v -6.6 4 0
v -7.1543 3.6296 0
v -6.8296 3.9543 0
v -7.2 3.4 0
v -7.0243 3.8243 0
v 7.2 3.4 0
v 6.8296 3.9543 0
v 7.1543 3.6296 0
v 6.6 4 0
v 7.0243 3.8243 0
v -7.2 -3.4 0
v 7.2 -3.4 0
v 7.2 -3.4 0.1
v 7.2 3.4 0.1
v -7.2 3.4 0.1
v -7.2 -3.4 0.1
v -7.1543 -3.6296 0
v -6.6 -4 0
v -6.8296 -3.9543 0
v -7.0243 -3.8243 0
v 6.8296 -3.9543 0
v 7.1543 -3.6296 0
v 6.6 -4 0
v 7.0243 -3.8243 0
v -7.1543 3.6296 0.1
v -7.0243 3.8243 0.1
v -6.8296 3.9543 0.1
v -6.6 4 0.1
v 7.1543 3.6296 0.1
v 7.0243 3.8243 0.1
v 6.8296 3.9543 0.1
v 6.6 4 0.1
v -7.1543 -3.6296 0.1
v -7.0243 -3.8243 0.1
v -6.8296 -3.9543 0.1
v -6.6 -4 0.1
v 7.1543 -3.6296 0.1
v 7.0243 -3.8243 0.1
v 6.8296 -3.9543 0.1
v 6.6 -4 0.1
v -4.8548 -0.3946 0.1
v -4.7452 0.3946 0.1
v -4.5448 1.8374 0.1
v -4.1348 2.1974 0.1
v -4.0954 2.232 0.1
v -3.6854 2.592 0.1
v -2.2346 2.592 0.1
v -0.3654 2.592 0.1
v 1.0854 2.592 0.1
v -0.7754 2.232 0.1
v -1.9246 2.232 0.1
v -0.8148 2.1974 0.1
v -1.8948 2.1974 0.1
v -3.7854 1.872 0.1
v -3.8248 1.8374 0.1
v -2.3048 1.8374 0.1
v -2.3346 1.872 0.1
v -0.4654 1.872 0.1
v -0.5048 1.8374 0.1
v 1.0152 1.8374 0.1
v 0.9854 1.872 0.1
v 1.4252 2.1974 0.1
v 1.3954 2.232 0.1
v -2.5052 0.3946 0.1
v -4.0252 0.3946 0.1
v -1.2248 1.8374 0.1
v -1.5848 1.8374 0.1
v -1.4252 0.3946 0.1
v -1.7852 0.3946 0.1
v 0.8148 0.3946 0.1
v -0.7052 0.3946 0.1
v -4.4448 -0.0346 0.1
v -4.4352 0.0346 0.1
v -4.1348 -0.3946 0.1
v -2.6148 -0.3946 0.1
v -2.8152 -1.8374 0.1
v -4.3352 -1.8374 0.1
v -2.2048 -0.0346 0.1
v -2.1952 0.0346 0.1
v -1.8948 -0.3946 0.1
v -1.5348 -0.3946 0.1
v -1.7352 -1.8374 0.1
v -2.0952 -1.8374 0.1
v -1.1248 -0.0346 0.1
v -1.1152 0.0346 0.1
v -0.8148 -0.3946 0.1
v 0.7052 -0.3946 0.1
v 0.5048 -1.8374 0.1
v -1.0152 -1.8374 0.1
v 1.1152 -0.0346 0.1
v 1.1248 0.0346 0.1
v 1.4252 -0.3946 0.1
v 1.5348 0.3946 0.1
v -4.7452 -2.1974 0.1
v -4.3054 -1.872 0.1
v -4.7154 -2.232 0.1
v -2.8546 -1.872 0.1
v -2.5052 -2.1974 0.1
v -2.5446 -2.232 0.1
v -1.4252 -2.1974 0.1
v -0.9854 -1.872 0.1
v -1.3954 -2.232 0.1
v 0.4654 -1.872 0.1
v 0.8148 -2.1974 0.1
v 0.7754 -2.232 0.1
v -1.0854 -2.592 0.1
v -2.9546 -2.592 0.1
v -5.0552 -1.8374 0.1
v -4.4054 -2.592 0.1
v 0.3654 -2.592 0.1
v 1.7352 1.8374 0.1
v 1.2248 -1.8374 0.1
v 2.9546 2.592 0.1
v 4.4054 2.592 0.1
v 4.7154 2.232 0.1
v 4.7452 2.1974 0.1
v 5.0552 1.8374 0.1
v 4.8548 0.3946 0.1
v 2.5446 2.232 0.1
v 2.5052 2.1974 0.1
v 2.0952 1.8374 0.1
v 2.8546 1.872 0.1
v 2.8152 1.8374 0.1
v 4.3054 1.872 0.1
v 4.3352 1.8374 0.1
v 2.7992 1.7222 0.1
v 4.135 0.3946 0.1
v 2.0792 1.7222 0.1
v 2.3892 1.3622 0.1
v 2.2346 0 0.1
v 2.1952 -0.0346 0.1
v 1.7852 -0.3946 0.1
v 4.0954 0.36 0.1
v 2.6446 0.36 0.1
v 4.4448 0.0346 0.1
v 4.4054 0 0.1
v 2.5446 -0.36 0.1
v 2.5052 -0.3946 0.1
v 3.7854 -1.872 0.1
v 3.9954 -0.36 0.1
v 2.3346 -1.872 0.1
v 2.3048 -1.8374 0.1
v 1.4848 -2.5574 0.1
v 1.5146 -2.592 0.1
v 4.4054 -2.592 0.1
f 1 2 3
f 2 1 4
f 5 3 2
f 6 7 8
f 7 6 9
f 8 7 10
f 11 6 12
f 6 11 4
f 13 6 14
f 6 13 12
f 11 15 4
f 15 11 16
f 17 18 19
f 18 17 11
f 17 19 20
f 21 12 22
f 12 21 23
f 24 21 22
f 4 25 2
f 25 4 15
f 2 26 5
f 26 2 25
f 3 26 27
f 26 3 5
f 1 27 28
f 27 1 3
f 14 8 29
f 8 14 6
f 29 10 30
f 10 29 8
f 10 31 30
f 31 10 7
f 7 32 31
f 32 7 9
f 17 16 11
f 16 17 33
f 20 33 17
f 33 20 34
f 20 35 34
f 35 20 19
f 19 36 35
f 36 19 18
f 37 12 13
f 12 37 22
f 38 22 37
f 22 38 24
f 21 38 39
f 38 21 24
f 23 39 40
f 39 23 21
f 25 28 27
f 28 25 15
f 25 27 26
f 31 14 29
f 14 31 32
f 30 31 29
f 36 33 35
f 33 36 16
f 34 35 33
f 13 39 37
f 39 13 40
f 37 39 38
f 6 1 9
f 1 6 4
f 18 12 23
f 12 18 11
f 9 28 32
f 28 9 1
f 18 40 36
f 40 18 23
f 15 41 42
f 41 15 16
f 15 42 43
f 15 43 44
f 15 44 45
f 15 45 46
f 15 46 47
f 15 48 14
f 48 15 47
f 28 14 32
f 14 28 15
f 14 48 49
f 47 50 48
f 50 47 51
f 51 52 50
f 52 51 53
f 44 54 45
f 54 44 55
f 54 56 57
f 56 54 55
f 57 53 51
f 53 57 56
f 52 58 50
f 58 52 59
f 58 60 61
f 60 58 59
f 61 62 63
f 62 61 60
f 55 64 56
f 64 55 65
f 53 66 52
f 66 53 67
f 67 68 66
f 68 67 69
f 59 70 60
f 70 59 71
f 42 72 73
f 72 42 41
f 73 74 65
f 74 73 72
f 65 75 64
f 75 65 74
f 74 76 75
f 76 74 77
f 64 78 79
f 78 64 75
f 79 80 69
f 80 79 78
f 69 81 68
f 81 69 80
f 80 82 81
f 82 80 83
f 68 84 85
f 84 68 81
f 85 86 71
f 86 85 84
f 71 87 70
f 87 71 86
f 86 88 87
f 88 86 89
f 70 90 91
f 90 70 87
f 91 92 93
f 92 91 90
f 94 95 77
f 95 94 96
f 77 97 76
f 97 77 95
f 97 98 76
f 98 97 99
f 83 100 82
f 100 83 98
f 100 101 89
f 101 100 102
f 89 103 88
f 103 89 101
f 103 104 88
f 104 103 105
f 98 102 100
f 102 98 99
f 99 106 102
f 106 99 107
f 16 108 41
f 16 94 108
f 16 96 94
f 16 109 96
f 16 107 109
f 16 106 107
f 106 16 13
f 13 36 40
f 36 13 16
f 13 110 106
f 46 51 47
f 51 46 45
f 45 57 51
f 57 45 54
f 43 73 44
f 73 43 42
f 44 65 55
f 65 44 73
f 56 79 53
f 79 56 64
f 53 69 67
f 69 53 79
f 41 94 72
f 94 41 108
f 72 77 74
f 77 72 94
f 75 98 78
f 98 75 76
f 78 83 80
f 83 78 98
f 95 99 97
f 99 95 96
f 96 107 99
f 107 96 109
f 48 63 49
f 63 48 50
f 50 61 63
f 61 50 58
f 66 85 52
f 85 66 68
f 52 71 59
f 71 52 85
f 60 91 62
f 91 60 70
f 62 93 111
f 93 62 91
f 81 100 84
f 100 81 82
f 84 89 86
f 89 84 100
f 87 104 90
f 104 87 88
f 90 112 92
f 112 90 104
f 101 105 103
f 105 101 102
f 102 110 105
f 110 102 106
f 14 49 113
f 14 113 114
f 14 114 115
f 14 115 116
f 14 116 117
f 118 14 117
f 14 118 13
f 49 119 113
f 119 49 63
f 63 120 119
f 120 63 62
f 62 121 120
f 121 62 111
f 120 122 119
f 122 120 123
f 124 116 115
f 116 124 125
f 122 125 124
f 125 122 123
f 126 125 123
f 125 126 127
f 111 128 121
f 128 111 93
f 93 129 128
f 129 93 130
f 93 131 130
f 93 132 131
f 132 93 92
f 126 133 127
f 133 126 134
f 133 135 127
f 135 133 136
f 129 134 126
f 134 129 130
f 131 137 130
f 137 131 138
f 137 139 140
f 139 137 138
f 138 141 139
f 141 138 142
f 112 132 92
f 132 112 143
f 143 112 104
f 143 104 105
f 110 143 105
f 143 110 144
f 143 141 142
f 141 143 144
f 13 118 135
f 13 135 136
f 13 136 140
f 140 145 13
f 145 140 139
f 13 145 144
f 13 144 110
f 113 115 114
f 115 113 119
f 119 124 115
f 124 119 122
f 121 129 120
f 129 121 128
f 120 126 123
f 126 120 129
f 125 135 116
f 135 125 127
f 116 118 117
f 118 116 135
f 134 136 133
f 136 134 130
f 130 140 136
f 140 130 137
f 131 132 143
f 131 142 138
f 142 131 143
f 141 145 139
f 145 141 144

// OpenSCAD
// file: ../p/box3u12.scad
use <../lib.scad>
function ldraw_lib__box3u12() = [
// 0 Box with 3 Parallel Faces without Any Edges
// 0 Name: box3u12.dat
// 0 Author: J.C. Tchang [tchang]
// 0 !LDRAW_ORG Primitive UPDATE 2014-02
// 0 !LICENSE Licensed under CC BY 4.0 : see CAreadme.txt
// 
// 0 BFC CERTIFY CCW
  [0,"BFC","CERTIFY"],
  [0,"BFC","CCW"],
// 
// 0 !HISTORY 2014-12-23 [PTadmin] Official Update 2014-02
// 
// 
// 4 16 -1 1 1 1 1 1 1 1 -1 -1 1 -1
  [4,16,-1,1,1,1,1,1,1,1,-1,-1,1,-1],
// 4 16 -1 1 1 -1 0 1 1 0 1 1 1 1
  [4,16,-1,1,1,-1,0,1,1,0,1,1,1,1],
// 4 16 1 1 -1 1 0 -1 -1 0 -1 -1 1 -1
  [4,16,1,1,-1,1,0,-1,-1,0,-1,-1,1,-1],
];
module ldraw_lib__box3u12(step=0, col=false, unit=2/5, alt=false, line=0.2, solid=!$preview)
    makepoly(ldraw_lib__box3u12(), step=step, col=col, unit=unit, alt=alt, line=line, solid=solid);
ldraw_lib__box3u12(line=0.2);
// file: ../p/1-4cyli.scad
use <../lib.scad>
function ldraw_lib__1_4cyli() = [
// 0 Cylinder 0.25
// 0 Name: 1-4cyli.dat
// 0 Author: James Jessiman
// 0 !LDRAW_ORG Primitive UPDATE 2012-01
// 0 !LICENSE Licensed under CC BY 4.0 : see CAreadme.txt
// 
// 0 BFC CERTIFY CCW
  [0,"BFC","CERTIFY"],
  [0,"BFC","CCW"],
// 
// 0 !HISTORY 2002-03-23 [sbliss] Added BFC statement.
// 0 !HISTORY 2002-04-25 [PTadmin] Official Update 2002-02
// 0 !HISTORY 2007-06-22 [PTadmin] Header formatted for Contributor Agreement
// 0 !HISTORY 2008-07-01 [PTadmin] Official Update 2008-01
// 0 !HISTORY 2012-02-16 [Philo] Changed to CCW
// 0 !HISTORY 2012-03-30 [PTadmin] Official Update 2012-01
// 
// 
// 4 16 1 1 0 0.9239 1 0.3827 0.9239 0 0.3827 1 0 0
  [4,16,1,1,0,0.9239,1,0.3827,0.9239,0,0.3827,1,0,0],
// 5 24 1 0 0 1 1 0 0.9239 0 0.3827 1 0 -1
  [5,24,1,0,0,1,1,0,0.9239,0,0.3827,1,0,-1],
// 4 16 0.9239 1 0.3827 0.7071 1 0.7071 0.7071 0 0.7071 0.9239 0 0.3827
  [4,16,0.9239,1,0.3827,0.7071,1,0.7071,0.7071,0,0.7071,0.9239,0,0.3827],
// 5 24 0.9239 0 0.3827 0.9239 1 0.3827 0.7071 0 0.7071 1 0 0
  [5,24,0.9239,0,0.3827,0.9239,1,0.3827,0.7071,0,0.7071,1,0,0],
// 4 16 0.7071 1 0.7071 0.3827 1 0.9239 0.3827 0 0.9239 0.7071 0 0.7071
  [4,16,0.7071,1,0.7071,0.3827,1,0.9239,0.3827,0,0.9239,0.7071,0,0.7071],
// 5 24 0.7071 0 0.7071 0.7071 1 0.7071 0.3827 0 0.9239 0.9239 0 0.3827
  [5,24,0.7071,0,0.7071,0.7071,1,0.7071,0.3827,0,0.9239,0.9239,0,0.3827],
// 4 16 0.3827 1 0.9239 0 1 1 0 0 1 0.3827 0 0.9239
  [4,16,0.3827,1,0.9239,0,1,1,0,0,1,0.3827,0,0.9239],
// 5 24 0.3827 0 0.9239 0.3827 1 0.9239 0 0 1 0.7071 0 0.7071
  [5,24,0.3827,0,0.9239,0.3827,1,0.9239,0,0,1,0.7071,0,0.7071],
// 5 24 0 0 1 0 1 1 0.3827 0 0.9239 -1 0 1
  [5,24,0,0,1,0,1,1,0.3827,0,0.9239,-1,0,1],
];
module ldraw_lib__1_4cyli(step=0, col=false, unit=2/5, alt=false, line=0.2, solid=!$preview)
    makepoly(ldraw_lib__1_4cyli(), step=step, col=col, unit=unit, alt=alt, line=line, solid=solid);
ldraw_lib__1_4cyli(line=0.2);
// file: ../p/1-4chrd.scad
use <../lib.scad>
function ldraw_lib__1_4chrd() = [
// 0 Chord 0.25
// 0 Name: 1-4chrd.dat
// 0 Author: Max Martin Richter [MMR1988]
// 0 !LDRAW_ORG Primitive UPDATE 2023-05
// 0 !LICENSE Licensed under CC BY 4.0 : see CAreadme.txt
// 
// 0 BFC CERTIFY CCW
  [0,"BFC","CERTIFY"],
  [0,"BFC","CCW"],
// 
// 0 !HISTORY 2004-04-22 [PTadmin] Official Update 2004-02
// 0 !HISTORY 2007-10-09 [PTadmin] Header formatted for Contributor Agreement
// 0 !HISTORY 2008-07-01 [PTadmin] Official Update 2008-01
// 0 !HISTORY 2012-08-02 [MMR1988] Re-creation with PrimGen2 and Rectifier
// 0 !HISTORY 2012-08-09 [PTadmin] Official Update 2012-02
// 0 !HISTORY 2023-10-27 [OrionP] Change author to MMR1988 from hafhead
// 0 !HISTORY 2023-10-31 [OrionP] Official Update 2023-05
// 
// 4 16 0.9239 0 0.3827 0.3827 0 0.9239 0 0 1 1 0 0
  [4,16,0.9239,0,0.3827,0.3827,0,0.9239,0,0,1,1,0,0],
// 3 16 0.7071 0 0.7071 0.3827 0 0.9239 0.9239 0 0.3827
  [3,16,0.7071,0,0.7071,0.3827,0,0.9239,0.9239,0,0.3827],
];
module ldraw_lib__1_4chrd(step=0, col=false, unit=2/5, alt=false, line=0.2, solid=!$preview)
    makepoly(ldraw_lib__1_4chrd(), step=step, col=col, unit=unit, alt=alt, line=line, solid=solid);
ldraw_lib__1_4chrd(line=0.2);
// main file
use <../lib.scad>
use <s/6221655aks01.scad>
function ldraw_lib__6221655al() = [
// 0 Sticker  1.0 x  1.8 with Yellow Digital "2" on Black Background
// 0 Name: 6221655al.dat
// 0 Author: Massimo Maso [Sirio]
// 0 !LDRAW_ORG Part UPDATE 2024-09
// 0 !LICENSE Licensed under CC BY 4.0 : see CAreadme.txt
// 
// 0 BFC CERTIFY CCW
  [0,"BFC","CERTIFY"],
  [0,"BFC","CCW"],
// 
// 0 !KEYWORDS 3.0, 911 RSR, Set 75888, Speed Champions, Turbo
// 
// 0 !HISTORY 2024-10-27 [OrionP] Official Update 2024-09
// 
// 0 // Subpart
// 1 16 0 0 0 1 0 0 0 1 0 0 0 1 s\6221655aks01.dat
  [1,16,0,0,0,1,0,0,0,1,0,0,0,1, ldraw_lib__s__6221655aks01()],
// 0 // Top face
// 0 // Black faces
// 3 0 18 -.25 8.5 2.7136 -.25 6.48 7.3864 -.25 6.48
  [3,0,18,-.25,8.5,2.7136,-.25,6.48,7.3864,-.25,6.48],
// 3 0 18 -.25 8.5 7.3864 -.25 6.48 11.0136 -.25 6.48
  [3,0,18,-.25,8.5,7.3864,-.25,6.48,11.0136,-.25,6.48],
// 3 0 18 -.25 8.5 11.0136 -.25 6.48 11.7886 -.25 5.58
  [3,0,18,-.25,8.5,11.0136,-.25,6.48,11.7886,-.25,5.58],
// 3 0 18 -.25 8.5 11.7886 -.25 5.58 11.863 -.25 5.4936
  [3,0,18,-.25,8.5,11.7886,-.25,5.58,11.863,-.25,5.4936],
// 3 0 18 -.25 8.5 11.863 -.25 5.4936 12.638 -.25 4.5936
  [3,0,18,-.25,8.5,11.863,-.25,5.4936,12.638,-.25,4.5936],
// 4 0 18 -.25 8.5 12.638 -.25 4.5936 12.137 -.25 .9864 18 -.25 -8.5
  [4,0,18,-.25,8.5,12.638,-.25,4.5936,12.137,-.25,.9864,18,-.25,-8.5],
// 4 0 6.3614 -.25 5.58 7.3864 -.25 6.48 2.7136 -.25 6.48 3.4886 -.25 5.58
  [4,0,6.3614,-.25,5.58,7.3864,-.25,6.48,2.7136,-.25,6.48,3.4886,-.25,5.58],
// 4 0 6.3614 -.25 5.58 3.4886 -.25 5.58 3.563 -.25 5.4936 6.263 -.25 5.4936
  [4,0,6.3614,-.25,5.58,3.4886,-.25,5.58,3.563,-.25,5.4936,6.263,-.25,5.4936],
// 4 0 6.263 -.25 5.4936 3.563 -.25 5.4936 4.338 -.25 4.5936 5.238 -.25 4.5936
  [4,0,6.263,-.25,5.4936,3.563,-.25,5.4936,4.338,-.25,4.5936,5.238,-.25,4.5936],
// 4 0 6.263 -.25 5.4936 7.038 -.25 4.5936 7.1364 -.25 4.68 6.3614 -.25 5.58
  [4,0,6.263,-.25,5.4936,7.038,-.25,4.5936,7.1364,-.25,4.68,6.3614,-.25,5.58],
// 4 0 10.838 -.25 4.5936 11.863 -.25 5.4936 11.7886 -.25 5.58 10.7636 -.25 4.68
  [4,0,10.838,-.25,4.5936,11.863,-.25,5.4936,11.7886,-.25,5.58,10.7636,-.25,4.68],
// 4 0 10.838 -.25 4.5936 10.7636 -.25 4.68 7.1364 -.25 4.68 7.038 -.25 4.5936
  [4,0,10.838,-.25,4.5936,10.7636,-.25,4.68,7.1364,-.25,4.68,7.038,-.25,4.5936],
// 4 0 10.838 -.25 4.5936 7.038 -.25 4.5936 6.998 -.25 4.3056 10.3375 -.25 .9864
  [4,0,10.838,-.25,4.5936,7.038,-.25,4.5936,6.998,-.25,4.3056,10.3375,-.25,.9864],
// 4 0 3.837 -.25 .9864 5.198 -.25 4.3056 5.238 -.25 4.5936 4.338 -.25 4.5936
  [4,0,3.837,-.25,.9864,5.198,-.25,4.3056,5.238,-.25,4.5936,4.338,-.25,4.5936],
// 4 0 3.837 -.25 .9864 5.5864 -.25 0 5.973 -.25 3.4056 5.198 -.25 4.3056
  [4,0,3.837,-.25,.9864,5.5864,-.25,0,5.973,-.25,3.4056,5.198,-.25,4.3056],
// 3 0 3.837 -.25 .9864 5.488 -.25 -.0864 5.5864 -.25 0
  [3,0,3.837,-.25,.9864,5.488,-.25,-.0864,5.5864,-.25,0],
// 4 0 3.837 -.25 .9864 3.563 -.25 -.9864 4.463 -.25 -.9864 5.488 -.25 -.0864
  [4,0,3.837,-.25,.9864,3.563,-.25,-.9864,4.463,-.25,-.9864,5.488,-.25,-.0864],
// 4 0 10.2386 -.25 .9 10.3375 -.25 .9864 6.998 -.25 4.3056 6.6114 -.25 .9
  [4,0,10.2386,-.25,.9,10.3375,-.25,.9864,6.998,-.25,4.3056,6.6114,-.25,.9],
// 4 0 10.2386 -.25 .9 11.0136 -.25 0 11.112 -.25 .0864 10.3375 -.25 .9864
  [4,0,10.2386,-.25,.9,11.0136,-.25,0,11.112,-.25,.0864,10.3375,-.25,.9864],
// 4 0 5.5864 -.25 0 6.6114 -.25 .9 6.998 -.25 4.3056 5.973 -.25 3.4056
  [4,0,5.5864,-.25,0,6.6114,-.25,.9,6.998,-.25,4.3056,5.973,-.25,3.4056],
// 4 0 5.5864 -.25 0 5.488 -.25 -.0864 6.263 -.25 -.9864 6.3614 -.25 -.9
  [4,0,5.5864,-.25,0,5.488,-.25,-.0864,6.263,-.25,-.9864,6.3614,-.25,-.9],
// 4 0 6.263 -.25 -.9864 9.4636 -.25 -4.68 9.9886 -.25 -.9 6.3614 -.25 -.9
  [4,0,6.263,-.25,-.9864,9.4636,-.25,-4.68,9.9886,-.25,-.9,6.3614,-.25,-.9],
// 4 0 6.263 -.25 -.9864 5.762 -.25 -4.5936 5.8364 -.25 -4.68 9.4636 -.25 -4.68
  [4,0,6.263,-.25,-.9864,5.762,-.25,-4.5936,5.8364,-.25,-4.68,9.4636,-.25,-4.68],
// 4 0 3.712 -.25 -6.3936 4.463 -.25 -.9864 3.563 -.25 -.9864 3.062 -.25 -4.5936
  [4,0,3.712,-.25,-6.3936,4.463,-.25,-.9864,3.563,-.25,-.9864,3.062,-.25,-4.5936],
// 3 0 3.712 -.25 -6.3936 3.062 -.25 -4.5936 2.037 -.25 -5.4936
  [3,0,3.712,-.25,-6.3936,3.062,-.25,-4.5936,2.037,-.25,-5.4936],
// 3 0 3.712 -.25 -6.3936 2.037 -.25 -5.4936 1.9386 -.25 -5.58
  [3,0,3.712,-.25,-6.3936,2.037,-.25,-5.4936,1.9386,-.25,-5.58],
// 4 0 3.712 -.25 -6.3936 1.9386 -.25 -5.58 .9136 -.25 -6.48 3.7864 -.25 -6.48
  [4,0,3.712,-.25,-6.3936,1.9386,-.25,-5.58,.9136,-.25,-6.48,3.7864,-.25,-6.48],
// 4 0 3.712 -.25 -6.3936 3.7864 -.25 -6.48 5.8364 -.25 -4.68 5.762 -.25 -4.5936
  [4,0,3.712,-.25,-6.3936,3.7864,-.25,-6.48,5.8364,-.25,-4.68,5.762,-.25,-4.5936],
// 3 0 18 -.25 -8.5 12.137 -.25 .9864 11.112 -.25 .0864
  [3,0,18,-.25,-8.5,12.137,-.25,.9864,11.112,-.25,.0864],
// 3 0 18 -.25 -8.5 11.112 -.25 .0864 11.0136 -.25 0
  [3,0,18,-.25,-8.5,11.112,-.25,.0864,11.0136,-.25,0],
// 3 0 18 -.25 -8.5 11.0136 -.25 0 9.9886 -.25 -.9
  [3,0,18,-.25,-8.5,11.0136,-.25,0,9.9886,-.25,-.9],
// 4 0 18 -.25 -8.5 9.9886 -.25 -.9 9.4636 -.25 -4.68 11.0136 -.25 -6.48
  [4,0,18,-.25,-8.5,9.9886,-.25,-.9,9.4636,-.25,-4.68,11.0136,-.25,-6.48],
// 3 0 18 -.25 -8.5 11.0136 -.25 -6.48 3.7864 -.25 -6.48
  [3,0,18,-.25,-8.5,11.0136,-.25,-6.48,3.7864,-.25,-6.48],
// 3 0 18 -.25 -8.5 3.7864 -.25 -6.48 .9136 -.25 -6.48
  [3,0,18,-.25,-8.5,3.7864,-.25,-6.48,.9136,-.25,-6.48],
// 0 // Yellow number
// 4 14 6.3614 -.25 5.58 11.7886 -.25 5.58 11.0136 -.25 6.48 7.3864 -.25 6.48
  [4,14,6.3614,-.25,5.58,11.7886,-.25,5.58,11.0136,-.25,6.48,7.3864,-.25,6.48],
// 4 14 6.3614 -.25 5.58 7.1364 -.25 4.68 10.7636 -.25 4.68 11.7886 -.25 5.58
  [4,14,6.3614,-.25,5.58,7.1364,-.25,4.68,10.7636,-.25,4.68,11.7886,-.25,5.58],
// 4 14 6.263 -.25 5.4936 5.238 -.25 4.5936 5.198 -.25 4.3056 5.973 -.25 3.4056
  [4,14,6.263,-.25,5.4936,5.238,-.25,4.5936,5.198,-.25,4.3056,5.973,-.25,3.4056],
// 4 14 6.263 -.25 5.4936 5.973 -.25 3.4056 6.998 -.25 4.3056 7.038 -.25 4.5936
  [4,14,6.263,-.25,5.4936,5.973,-.25,3.4056,6.998,-.25,4.3056,7.038,-.25,4.5936],
// 4 14 11.863 -.25 5.4936 10.838 -.25 4.5936 10.3375 -.25 .9864 11.112 -.25 .0864
  [4,14,11.863,-.25,5.4936,10.838,-.25,4.5936,10.3375,-.25,.9864,11.112,-.25,.0864],
// 4 14 11.863 -.25 5.4936 11.112 -.25 .0864 12.137 -.25 .9864 12.638 -.25 4.5936
  [4,14,11.863,-.25,5.4936,11.112,-.25,.0864,12.137,-.25,.9864,12.638,-.25,4.5936],
// 4 14 5.5864 -.25 0 11.0136 -.25 0 10.2386 -.25 .9 6.6114 -.25 .9
  [4,14,5.5864,-.25,0,11.0136,-.25,0,10.2386,-.25,.9,6.6114,-.25,.9],
// 4 14 5.5864 -.25 0 6.3614 -.25 -.9 9.9886 -.25 -.9 11.0136 -.25 0
  [4,14,5.5864,-.25,0,6.3614,-.25,-.9,9.9886,-.25,-.9,11.0136,-.25,0],
// 3 14 5.488 -.25 -.0864 4.463 -.25 -.9864 3.712 -.25 -6.3936
  [3,14,5.488,-.25,-.0864,4.463,-.25,-.9864,3.712,-.25,-6.3936],
// 4 14 5.488 -.25 -.0864 3.712 -.25 -6.3936 5.762 -.25 -4.5936 6.263 -.25 -.9864
  [4,14,5.488,-.25,-.0864,3.712,-.25,-6.3936,5.762,-.25,-4.5936,6.263,-.25,-.9864],
// 4 14 3.7864 -.25 -6.48 11.0136 -.25 -6.48 9.4636 -.25 -4.68 5.8364 -.25 -4.68
  [4,14,3.7864,-.25,-6.48,11.0136,-.25,-6.48,9.4636,-.25,-4.68,5.8364,-.25,-4.68],
];
module ldraw_lib__6221655al(step=0, col=false, unit=2/5, alt=false, line=0.2, solid=!$preview)
    makepoly(ldraw_lib__6221655al(), step=step, col=col, unit=unit, alt=alt, line=line, solid=solid);
ldraw_lib__6221655al(line=0.2);
